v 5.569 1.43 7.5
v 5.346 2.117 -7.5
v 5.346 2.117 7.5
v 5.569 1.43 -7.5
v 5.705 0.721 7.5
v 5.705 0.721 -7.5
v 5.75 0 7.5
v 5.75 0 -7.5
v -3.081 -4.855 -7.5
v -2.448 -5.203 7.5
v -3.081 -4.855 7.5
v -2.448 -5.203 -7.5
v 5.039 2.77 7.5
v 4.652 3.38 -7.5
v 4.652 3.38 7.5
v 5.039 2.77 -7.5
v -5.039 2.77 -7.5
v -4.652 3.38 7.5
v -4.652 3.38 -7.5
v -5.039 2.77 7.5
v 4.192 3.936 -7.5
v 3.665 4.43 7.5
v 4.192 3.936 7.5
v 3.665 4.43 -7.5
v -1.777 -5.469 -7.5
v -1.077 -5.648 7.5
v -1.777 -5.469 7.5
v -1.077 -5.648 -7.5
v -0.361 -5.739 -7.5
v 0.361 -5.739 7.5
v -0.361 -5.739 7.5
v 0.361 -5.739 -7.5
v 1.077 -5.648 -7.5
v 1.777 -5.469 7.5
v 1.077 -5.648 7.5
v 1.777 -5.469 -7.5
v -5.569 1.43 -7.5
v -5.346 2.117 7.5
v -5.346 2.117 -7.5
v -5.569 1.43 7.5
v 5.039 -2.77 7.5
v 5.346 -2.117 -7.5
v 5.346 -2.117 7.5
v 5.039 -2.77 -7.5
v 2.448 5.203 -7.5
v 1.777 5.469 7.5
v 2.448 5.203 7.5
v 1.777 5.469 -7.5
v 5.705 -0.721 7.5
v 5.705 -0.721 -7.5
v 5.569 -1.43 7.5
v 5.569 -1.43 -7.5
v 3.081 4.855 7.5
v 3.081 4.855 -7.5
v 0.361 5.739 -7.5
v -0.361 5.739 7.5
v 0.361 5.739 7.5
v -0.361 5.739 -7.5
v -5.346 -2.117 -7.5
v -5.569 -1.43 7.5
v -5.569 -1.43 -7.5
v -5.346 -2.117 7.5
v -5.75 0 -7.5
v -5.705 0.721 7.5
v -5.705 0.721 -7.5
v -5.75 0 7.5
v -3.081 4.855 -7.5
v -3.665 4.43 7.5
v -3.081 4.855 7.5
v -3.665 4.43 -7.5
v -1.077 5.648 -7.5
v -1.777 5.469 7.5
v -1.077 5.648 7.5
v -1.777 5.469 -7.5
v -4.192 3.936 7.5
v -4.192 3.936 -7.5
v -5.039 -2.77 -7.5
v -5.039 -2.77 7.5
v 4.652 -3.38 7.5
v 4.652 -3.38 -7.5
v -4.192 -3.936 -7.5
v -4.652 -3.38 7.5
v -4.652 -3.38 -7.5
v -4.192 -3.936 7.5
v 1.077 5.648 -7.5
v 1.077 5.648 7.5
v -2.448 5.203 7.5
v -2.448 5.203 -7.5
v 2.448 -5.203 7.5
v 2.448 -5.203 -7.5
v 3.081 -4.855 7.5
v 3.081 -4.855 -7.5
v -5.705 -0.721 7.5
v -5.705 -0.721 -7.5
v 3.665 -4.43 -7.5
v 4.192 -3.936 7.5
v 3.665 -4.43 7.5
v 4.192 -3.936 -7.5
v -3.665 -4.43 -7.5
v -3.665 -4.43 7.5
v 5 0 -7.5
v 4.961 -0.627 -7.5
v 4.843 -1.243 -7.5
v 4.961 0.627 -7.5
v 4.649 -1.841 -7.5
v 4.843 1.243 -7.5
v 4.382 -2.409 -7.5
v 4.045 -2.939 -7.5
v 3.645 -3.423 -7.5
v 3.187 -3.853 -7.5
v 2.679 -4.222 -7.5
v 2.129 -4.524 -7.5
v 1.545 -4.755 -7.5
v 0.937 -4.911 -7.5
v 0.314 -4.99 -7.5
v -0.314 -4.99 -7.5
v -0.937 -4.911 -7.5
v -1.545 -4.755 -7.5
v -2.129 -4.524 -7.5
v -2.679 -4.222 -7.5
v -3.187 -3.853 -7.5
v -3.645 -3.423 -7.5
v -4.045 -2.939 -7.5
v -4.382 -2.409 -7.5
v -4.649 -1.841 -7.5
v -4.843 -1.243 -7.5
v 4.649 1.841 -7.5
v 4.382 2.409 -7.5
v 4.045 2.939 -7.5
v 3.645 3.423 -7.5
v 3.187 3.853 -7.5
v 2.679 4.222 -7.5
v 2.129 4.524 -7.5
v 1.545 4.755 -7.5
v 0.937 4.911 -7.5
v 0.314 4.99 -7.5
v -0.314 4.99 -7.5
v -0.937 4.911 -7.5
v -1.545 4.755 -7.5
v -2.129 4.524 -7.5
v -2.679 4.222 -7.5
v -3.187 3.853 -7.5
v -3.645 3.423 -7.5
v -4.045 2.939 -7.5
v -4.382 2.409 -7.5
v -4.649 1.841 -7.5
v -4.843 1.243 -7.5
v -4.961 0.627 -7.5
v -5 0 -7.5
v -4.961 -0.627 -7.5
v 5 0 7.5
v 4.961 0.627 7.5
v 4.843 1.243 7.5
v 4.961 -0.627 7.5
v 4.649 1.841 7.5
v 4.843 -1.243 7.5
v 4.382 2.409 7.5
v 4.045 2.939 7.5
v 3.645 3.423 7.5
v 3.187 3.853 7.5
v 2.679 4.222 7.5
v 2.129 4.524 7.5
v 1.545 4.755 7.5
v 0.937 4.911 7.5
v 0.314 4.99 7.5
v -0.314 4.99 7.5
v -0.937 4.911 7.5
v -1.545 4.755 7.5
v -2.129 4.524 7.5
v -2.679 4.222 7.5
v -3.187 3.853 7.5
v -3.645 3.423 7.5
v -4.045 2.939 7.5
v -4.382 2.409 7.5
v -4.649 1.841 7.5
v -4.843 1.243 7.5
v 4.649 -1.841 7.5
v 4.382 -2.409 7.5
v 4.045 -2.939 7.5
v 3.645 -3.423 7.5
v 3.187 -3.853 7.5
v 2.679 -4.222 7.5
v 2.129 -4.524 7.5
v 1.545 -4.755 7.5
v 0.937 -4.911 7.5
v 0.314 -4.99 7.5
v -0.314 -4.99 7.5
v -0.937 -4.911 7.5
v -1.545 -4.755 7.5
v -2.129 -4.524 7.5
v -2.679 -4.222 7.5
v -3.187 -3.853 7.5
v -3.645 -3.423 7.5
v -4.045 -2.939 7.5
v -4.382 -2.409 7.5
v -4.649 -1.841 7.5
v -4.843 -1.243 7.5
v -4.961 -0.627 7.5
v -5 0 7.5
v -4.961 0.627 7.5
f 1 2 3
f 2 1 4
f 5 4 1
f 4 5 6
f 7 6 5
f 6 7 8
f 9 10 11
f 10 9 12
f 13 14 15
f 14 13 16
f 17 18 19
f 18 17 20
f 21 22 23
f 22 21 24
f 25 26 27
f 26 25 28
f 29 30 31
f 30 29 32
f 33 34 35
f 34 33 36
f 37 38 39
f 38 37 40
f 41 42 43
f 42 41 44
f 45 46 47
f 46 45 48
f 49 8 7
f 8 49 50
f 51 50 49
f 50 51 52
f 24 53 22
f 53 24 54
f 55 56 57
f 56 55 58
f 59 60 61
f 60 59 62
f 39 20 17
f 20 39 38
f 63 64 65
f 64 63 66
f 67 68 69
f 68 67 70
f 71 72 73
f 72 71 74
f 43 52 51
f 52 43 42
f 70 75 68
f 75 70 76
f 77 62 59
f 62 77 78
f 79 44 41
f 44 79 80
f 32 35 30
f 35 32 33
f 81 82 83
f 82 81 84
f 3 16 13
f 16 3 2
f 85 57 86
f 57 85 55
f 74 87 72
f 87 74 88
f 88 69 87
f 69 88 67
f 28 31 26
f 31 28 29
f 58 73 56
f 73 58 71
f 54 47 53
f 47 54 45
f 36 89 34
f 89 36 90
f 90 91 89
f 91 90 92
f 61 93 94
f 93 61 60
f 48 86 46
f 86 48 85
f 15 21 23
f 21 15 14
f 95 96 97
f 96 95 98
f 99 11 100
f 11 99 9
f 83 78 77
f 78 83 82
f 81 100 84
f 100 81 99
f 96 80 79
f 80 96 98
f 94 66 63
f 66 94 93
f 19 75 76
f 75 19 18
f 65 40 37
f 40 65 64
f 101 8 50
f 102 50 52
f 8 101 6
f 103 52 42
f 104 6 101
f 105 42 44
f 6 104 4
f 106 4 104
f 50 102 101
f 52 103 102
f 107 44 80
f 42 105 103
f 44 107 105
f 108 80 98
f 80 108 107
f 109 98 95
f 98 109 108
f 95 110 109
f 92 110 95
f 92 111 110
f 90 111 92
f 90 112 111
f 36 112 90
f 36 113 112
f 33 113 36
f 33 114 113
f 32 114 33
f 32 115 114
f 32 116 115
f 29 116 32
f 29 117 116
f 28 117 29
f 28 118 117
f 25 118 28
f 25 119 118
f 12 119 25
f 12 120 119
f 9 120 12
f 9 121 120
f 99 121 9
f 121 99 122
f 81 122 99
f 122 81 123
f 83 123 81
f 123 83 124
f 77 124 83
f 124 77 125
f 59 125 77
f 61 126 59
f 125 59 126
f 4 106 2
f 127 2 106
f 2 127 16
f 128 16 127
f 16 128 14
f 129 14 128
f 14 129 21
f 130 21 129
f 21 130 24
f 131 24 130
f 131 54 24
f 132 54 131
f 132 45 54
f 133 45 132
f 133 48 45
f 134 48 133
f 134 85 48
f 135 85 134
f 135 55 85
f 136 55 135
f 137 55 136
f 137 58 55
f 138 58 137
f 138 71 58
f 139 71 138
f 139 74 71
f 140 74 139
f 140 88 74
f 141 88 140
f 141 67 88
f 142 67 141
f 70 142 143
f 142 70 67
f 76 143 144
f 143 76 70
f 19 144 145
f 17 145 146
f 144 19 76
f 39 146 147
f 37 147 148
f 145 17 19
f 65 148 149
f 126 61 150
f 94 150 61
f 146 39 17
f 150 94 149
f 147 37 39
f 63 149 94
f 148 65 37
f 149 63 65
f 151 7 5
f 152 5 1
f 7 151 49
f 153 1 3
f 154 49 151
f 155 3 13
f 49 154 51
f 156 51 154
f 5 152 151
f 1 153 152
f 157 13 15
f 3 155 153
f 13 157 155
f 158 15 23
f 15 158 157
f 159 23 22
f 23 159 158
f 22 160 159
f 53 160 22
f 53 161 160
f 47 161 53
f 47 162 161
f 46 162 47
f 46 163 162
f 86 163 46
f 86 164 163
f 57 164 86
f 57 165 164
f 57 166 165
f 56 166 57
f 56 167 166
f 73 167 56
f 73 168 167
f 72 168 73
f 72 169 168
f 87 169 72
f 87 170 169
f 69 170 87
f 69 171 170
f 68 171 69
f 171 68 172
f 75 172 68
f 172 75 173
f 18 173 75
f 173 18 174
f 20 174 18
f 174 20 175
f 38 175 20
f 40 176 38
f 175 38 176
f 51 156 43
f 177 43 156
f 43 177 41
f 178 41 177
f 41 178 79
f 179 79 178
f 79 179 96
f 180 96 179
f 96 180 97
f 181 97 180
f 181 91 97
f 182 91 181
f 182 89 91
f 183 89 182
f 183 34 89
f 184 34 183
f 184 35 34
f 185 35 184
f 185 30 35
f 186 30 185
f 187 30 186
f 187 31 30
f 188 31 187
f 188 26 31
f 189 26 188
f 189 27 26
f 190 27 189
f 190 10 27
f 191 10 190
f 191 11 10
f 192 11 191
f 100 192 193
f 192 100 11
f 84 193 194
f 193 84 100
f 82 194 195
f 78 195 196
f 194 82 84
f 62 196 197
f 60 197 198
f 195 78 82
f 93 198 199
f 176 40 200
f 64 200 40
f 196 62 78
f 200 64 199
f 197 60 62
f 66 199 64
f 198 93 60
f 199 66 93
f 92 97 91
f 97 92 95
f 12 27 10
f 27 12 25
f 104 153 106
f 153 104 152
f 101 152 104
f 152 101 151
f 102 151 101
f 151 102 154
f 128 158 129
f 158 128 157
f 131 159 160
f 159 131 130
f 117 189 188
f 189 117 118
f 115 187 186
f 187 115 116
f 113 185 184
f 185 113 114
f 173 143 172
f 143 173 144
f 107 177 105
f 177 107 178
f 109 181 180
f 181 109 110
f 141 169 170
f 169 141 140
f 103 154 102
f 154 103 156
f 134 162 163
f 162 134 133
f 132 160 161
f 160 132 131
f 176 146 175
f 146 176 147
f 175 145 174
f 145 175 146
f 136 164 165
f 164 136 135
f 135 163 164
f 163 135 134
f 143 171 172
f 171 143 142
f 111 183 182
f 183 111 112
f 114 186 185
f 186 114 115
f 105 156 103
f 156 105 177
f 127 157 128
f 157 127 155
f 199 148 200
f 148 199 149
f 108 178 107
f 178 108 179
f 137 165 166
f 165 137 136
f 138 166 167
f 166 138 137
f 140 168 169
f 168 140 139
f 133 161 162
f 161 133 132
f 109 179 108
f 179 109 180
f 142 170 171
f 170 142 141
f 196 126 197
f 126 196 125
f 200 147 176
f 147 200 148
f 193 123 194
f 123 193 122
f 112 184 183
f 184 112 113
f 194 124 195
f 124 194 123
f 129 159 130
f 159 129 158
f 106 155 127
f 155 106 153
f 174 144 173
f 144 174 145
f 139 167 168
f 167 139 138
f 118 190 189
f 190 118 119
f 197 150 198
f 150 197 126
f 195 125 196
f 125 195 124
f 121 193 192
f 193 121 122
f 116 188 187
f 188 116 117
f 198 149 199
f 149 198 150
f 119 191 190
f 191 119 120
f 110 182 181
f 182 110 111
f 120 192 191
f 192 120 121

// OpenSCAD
$fn = 50;


difference() {
	union() {
		translate(v = [0, 0, -7.5000000000]) {
			cylinder(h = 15, r = 5.7500000000);
		}
	}
	union() {
		translate(v = [0, 0, -100.0000000000]) {
			cylinder(h = 200, r = 5.0000000000);
		}
	}
}
